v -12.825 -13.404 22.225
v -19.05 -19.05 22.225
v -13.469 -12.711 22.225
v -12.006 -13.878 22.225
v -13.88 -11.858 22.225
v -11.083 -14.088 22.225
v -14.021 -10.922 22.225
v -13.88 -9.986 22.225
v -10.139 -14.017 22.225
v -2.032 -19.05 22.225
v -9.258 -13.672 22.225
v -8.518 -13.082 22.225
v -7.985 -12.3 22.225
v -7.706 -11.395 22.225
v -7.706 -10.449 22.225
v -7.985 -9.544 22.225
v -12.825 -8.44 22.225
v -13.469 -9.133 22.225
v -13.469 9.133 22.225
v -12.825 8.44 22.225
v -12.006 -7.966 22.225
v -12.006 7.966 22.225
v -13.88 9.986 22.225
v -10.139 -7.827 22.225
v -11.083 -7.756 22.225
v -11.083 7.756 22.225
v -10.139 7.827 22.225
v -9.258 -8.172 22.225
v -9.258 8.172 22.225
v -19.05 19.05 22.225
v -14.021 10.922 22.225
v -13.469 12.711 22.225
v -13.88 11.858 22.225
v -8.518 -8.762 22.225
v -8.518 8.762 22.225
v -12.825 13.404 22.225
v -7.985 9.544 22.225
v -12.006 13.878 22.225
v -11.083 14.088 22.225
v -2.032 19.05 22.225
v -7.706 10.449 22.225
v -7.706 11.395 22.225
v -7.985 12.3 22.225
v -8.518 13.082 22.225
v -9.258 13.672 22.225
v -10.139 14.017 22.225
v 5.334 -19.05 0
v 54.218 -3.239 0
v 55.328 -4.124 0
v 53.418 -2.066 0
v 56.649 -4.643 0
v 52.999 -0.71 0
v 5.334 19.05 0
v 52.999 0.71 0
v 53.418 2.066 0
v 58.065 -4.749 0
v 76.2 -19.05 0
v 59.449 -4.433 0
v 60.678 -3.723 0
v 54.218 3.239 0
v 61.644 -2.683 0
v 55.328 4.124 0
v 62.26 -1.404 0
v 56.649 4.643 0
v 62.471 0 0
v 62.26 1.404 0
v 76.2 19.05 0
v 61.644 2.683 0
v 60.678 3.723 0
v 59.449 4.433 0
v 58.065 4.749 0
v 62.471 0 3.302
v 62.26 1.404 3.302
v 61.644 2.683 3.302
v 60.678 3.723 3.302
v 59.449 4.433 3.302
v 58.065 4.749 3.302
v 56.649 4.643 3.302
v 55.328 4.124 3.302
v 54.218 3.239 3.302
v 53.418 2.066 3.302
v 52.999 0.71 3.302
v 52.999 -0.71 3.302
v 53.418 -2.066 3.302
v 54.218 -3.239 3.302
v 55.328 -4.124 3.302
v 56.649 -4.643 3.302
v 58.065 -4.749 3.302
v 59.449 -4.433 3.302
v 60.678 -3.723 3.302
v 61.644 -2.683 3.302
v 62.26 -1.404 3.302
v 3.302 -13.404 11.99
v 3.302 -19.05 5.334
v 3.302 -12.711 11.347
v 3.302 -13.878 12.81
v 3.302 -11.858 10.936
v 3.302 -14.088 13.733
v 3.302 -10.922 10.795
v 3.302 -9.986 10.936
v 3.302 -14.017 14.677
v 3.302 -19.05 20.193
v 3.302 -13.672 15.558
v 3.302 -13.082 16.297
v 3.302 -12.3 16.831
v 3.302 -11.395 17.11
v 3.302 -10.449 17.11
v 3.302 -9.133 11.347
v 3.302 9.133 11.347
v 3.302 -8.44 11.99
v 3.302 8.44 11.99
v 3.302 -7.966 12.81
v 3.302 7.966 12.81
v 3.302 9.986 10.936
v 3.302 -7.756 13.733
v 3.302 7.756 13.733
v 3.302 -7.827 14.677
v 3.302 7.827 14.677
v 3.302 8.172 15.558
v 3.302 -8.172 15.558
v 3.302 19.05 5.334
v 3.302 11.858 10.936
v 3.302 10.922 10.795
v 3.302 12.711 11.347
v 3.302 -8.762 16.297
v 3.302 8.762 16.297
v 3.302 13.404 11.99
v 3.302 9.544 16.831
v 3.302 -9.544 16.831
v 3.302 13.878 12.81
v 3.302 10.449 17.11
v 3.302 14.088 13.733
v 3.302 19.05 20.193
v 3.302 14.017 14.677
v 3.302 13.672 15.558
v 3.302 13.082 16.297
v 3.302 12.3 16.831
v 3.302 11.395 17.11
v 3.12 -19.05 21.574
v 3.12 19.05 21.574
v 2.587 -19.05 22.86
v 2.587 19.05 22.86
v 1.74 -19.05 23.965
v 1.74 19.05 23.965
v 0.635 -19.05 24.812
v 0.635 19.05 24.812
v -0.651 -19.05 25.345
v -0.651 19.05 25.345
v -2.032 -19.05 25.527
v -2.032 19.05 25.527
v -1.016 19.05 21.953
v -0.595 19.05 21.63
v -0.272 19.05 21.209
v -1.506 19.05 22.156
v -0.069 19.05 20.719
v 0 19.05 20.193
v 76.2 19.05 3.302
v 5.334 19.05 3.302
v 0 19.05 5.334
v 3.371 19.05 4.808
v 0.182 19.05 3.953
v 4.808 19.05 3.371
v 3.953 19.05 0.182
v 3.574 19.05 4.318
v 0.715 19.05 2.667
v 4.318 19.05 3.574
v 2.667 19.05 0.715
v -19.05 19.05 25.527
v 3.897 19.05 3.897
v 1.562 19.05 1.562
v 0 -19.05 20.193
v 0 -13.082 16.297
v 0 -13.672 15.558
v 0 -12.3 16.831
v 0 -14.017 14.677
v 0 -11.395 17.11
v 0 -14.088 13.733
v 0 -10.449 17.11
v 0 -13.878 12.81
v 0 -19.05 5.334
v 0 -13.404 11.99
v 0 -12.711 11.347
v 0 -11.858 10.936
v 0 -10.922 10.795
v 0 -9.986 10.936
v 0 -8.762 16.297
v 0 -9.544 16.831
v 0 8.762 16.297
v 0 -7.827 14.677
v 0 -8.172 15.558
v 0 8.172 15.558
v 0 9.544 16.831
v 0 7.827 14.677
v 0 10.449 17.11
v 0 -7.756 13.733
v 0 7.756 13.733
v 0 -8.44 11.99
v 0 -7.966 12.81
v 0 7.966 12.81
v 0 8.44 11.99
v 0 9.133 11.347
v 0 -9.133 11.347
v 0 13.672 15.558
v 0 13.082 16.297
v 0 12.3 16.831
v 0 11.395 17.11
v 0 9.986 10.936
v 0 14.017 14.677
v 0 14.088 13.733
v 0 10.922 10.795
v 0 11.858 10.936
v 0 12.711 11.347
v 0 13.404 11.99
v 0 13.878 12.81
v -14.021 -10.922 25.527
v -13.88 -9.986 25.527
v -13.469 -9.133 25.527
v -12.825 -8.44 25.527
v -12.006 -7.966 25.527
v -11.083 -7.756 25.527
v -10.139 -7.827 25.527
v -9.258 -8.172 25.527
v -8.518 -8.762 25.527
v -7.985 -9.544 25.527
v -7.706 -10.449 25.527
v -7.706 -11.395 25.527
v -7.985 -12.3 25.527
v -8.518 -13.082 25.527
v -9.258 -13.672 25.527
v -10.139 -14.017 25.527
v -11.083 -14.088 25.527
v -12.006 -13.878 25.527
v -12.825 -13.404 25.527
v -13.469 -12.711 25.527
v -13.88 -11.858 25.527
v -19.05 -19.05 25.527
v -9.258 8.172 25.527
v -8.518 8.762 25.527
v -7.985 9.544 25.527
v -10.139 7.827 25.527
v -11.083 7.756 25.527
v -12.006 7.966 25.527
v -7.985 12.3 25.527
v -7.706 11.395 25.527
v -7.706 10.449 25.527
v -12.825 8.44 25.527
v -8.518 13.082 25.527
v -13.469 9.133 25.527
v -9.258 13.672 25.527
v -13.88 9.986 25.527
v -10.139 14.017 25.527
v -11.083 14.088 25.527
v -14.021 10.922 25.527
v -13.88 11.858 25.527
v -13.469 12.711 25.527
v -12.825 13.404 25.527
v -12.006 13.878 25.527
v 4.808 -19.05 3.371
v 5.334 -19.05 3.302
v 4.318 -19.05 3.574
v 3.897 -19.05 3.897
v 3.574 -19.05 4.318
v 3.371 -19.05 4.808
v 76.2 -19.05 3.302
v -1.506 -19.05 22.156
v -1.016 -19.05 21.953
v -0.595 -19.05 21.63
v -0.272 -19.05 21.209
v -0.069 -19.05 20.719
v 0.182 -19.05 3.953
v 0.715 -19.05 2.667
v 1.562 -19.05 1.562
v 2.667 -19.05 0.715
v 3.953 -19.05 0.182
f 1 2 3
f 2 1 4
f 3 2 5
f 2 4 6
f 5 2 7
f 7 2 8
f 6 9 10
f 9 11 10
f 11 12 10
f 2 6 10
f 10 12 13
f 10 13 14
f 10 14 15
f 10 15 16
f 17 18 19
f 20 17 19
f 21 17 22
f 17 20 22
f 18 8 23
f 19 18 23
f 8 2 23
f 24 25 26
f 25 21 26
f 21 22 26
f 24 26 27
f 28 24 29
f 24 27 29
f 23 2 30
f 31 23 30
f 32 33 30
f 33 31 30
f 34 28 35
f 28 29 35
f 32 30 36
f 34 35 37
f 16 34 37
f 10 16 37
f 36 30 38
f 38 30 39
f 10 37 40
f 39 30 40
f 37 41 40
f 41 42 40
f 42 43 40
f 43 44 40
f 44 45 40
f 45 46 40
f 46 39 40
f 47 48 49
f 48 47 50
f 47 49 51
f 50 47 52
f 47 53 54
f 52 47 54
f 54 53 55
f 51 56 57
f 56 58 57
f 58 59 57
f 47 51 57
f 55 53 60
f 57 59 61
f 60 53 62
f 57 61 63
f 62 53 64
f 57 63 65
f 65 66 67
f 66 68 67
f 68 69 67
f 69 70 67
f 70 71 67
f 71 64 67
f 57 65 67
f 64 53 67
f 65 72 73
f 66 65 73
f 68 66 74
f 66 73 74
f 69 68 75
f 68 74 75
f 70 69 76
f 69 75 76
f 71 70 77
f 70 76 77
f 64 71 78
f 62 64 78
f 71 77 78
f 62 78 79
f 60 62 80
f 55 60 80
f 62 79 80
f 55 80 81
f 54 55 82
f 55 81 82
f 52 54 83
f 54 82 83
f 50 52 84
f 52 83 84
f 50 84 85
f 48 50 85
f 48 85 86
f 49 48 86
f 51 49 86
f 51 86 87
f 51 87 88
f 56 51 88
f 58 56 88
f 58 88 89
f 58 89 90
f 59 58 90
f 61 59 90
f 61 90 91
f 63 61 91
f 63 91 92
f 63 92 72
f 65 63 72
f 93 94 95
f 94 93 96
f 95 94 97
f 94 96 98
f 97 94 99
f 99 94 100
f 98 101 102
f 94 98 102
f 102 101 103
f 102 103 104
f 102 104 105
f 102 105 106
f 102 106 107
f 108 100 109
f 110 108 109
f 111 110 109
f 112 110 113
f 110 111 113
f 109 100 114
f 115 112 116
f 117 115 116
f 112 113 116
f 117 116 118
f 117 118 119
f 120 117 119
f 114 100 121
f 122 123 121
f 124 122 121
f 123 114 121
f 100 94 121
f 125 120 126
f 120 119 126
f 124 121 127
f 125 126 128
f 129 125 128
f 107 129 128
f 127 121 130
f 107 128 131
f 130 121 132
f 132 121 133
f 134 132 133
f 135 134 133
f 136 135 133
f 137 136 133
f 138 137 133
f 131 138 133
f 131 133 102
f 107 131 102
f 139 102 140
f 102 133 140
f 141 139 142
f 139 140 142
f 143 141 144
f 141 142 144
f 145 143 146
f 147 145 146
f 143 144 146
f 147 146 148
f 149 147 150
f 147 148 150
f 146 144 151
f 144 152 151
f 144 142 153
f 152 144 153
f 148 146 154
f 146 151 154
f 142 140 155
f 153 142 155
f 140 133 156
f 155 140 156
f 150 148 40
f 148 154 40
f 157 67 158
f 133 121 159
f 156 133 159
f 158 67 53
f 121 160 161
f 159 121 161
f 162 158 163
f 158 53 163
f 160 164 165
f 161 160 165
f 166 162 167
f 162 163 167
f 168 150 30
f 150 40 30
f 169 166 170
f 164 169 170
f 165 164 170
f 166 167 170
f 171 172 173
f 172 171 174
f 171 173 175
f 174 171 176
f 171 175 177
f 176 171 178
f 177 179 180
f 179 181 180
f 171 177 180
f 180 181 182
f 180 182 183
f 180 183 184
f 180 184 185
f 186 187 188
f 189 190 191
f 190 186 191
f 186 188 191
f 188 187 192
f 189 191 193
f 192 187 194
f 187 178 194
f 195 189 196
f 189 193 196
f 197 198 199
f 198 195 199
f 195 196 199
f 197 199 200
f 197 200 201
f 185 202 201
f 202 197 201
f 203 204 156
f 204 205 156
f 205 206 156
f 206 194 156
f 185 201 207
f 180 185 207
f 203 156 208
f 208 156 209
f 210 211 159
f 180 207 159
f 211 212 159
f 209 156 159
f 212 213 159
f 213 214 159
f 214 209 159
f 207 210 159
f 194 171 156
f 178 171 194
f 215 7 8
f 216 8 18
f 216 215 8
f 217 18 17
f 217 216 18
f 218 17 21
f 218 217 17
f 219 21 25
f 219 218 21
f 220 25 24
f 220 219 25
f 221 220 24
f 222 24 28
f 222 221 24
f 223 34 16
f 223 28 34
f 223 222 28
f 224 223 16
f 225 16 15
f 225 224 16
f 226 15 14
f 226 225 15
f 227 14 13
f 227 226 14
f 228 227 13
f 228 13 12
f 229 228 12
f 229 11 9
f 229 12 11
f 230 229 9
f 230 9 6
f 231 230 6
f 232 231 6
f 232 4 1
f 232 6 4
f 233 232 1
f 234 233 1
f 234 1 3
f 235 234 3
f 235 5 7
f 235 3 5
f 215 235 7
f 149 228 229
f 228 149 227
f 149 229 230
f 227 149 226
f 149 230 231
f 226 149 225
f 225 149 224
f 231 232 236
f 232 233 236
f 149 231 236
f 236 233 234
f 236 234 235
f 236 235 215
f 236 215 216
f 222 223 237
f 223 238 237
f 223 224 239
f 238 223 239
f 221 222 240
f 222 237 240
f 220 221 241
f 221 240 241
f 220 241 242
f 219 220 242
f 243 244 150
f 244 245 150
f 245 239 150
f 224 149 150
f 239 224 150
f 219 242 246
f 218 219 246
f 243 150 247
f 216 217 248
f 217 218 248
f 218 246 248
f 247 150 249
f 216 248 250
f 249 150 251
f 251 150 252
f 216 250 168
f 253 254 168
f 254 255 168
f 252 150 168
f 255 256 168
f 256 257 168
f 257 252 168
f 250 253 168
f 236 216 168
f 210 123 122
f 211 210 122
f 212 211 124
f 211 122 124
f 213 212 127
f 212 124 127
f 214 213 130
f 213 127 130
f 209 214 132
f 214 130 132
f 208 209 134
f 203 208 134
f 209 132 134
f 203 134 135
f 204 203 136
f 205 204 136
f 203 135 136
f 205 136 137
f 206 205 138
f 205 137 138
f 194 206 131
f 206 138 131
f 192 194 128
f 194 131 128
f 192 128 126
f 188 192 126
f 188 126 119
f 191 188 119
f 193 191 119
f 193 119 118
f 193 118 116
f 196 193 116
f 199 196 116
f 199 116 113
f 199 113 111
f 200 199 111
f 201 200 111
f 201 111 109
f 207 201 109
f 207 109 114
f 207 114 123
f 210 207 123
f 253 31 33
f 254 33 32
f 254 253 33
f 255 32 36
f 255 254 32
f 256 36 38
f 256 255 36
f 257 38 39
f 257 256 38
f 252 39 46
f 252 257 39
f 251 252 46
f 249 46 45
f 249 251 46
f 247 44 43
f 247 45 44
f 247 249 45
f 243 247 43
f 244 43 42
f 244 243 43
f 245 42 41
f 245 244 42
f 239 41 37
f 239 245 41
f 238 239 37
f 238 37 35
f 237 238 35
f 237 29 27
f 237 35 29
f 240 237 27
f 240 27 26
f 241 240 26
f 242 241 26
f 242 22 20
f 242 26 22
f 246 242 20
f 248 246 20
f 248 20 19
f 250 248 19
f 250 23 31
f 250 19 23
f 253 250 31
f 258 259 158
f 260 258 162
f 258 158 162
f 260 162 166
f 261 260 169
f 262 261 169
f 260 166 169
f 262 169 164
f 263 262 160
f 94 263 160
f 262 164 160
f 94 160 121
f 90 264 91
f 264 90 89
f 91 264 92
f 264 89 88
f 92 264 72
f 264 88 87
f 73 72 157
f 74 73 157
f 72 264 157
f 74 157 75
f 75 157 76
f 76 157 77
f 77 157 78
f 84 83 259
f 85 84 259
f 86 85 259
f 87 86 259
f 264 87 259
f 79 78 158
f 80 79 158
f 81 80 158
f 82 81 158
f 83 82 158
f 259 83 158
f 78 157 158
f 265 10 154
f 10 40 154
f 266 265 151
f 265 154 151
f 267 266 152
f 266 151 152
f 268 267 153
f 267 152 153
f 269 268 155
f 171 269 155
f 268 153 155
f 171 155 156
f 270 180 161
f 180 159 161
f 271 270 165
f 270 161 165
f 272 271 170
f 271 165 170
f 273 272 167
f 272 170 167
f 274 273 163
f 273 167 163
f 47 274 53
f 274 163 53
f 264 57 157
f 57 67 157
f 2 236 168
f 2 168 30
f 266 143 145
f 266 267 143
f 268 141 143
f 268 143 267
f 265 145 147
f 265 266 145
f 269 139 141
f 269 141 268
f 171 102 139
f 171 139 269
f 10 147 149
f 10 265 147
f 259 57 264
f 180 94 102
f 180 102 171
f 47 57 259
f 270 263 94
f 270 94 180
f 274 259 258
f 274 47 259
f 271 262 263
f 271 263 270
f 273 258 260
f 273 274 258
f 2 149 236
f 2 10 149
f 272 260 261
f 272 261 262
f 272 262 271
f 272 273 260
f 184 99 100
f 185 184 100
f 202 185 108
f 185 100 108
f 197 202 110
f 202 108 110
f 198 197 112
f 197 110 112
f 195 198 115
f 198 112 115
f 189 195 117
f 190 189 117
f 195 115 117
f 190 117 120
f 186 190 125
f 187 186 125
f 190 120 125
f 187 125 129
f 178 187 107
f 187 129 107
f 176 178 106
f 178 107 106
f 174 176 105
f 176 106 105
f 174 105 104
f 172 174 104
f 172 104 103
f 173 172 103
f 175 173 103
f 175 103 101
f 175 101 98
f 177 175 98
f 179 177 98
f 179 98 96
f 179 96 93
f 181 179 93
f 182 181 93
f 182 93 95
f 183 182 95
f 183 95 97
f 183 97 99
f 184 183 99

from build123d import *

# Parameters (mm, degrees)
EXTRUDE_THIN1_DEPTH = 19.05
SKETCH4_R           = 3.175
EXTRUDE3_DEPTH      = 104.450523701
SKETCH9_R           = 3.175
CUT_EXTRUDE3_DEPTH  = 80.552804055
SKETCH8_R           = 4.7625
CUT_EXTRUDE2_DEPTH  = 82.628996839


with BuildPart() as part:
    # Sketch1 → Extrude-Thin1 (new, symmetric)
    with BuildSketch(Plane(origin=(0, 0, 0), x_dir=(1, 0, 0), z_dir=(0, 1, 0))):
        with BuildLine():
            Line((-19.05, -22.225), (-2.032, -22.225))
            ThreePointArc((-2.032, -22.225), (-0.595159021, -21.629840979), (0, -20.193))
            Line((0, -20.193), (0, -5.334))
            ThreePointArc((0, -5.334), (1.562292429, -1.562292429), (5.334, 0))
            Line((5.334, 0), (76.2, 0))
            Line((76.2, 0), (76.2, -3.302))
            Line((76.2, -3.302), (5.334, -3.302))
            ThreePointArc((5.334, -3.302), (3.897159021, -3.897159021), (3.302, -5.334))
            Line((3.302, -5.334), (3.302, -20.193))
            ThreePointArc((3.302, -20.193), (1.739707571, -23.964707571), (-2.032, -25.527))
            Line((-2.032, -25.527), (-19.05, -25.527))
            Line((-19.05, -25.527), (-19.05, -22.225))
        make_face()
    extrude(amount=EXTRUDE_THIN1_DEPTH, both=True)

    # Sketch4 → Extrude3 (cut, through all)
    with BuildSketch(Plane(origin=(-22.225, 0, 25.527), x_dir=(-1, 0, 0), z_dir=(0, 0, -1))):
        with Locations((-11.3792, 10.922)):
            Circle(SKETCH4_R)
        with Locations((-11.3792, -10.922)):
            Circle(SKETCH4_R)
    extrude(amount=EXTRUDE3_DEPTH, mode=Mode.SUBTRACT)

    # Sketch9 → Cut-Extrude3 (cut, through all)
    with BuildSketch(Plane(origin=(3.302, 0, 0), x_dir=(0, 0, -1), z_dir=(1, 0, 0))):
        with Locations((-13.97, 10.922)):
            Circle(SKETCH9_R)
        with Locations((-13.97, -10.922)):
            Circle(SKETCH9_R)
    extrude(amount=-CUT_EXTRUDE3_DEPTH, mode=Mode.SUBTRACT)

    # Sketch8 → Cut-Extrude2 (cut, through all)
    with BuildSketch(Plane.XY.offset(3.302)):
        with Locations((57.7088, 0)):
            Circle(SKETCH8_R)
        with Locations((-12.1412, 0)):
            Circle(SKETCH8_R)
    extrude(amount=-CUT_EXTRUDE2_DEPTH, mode=Mode.SUBTRACT)


solid = part.part
